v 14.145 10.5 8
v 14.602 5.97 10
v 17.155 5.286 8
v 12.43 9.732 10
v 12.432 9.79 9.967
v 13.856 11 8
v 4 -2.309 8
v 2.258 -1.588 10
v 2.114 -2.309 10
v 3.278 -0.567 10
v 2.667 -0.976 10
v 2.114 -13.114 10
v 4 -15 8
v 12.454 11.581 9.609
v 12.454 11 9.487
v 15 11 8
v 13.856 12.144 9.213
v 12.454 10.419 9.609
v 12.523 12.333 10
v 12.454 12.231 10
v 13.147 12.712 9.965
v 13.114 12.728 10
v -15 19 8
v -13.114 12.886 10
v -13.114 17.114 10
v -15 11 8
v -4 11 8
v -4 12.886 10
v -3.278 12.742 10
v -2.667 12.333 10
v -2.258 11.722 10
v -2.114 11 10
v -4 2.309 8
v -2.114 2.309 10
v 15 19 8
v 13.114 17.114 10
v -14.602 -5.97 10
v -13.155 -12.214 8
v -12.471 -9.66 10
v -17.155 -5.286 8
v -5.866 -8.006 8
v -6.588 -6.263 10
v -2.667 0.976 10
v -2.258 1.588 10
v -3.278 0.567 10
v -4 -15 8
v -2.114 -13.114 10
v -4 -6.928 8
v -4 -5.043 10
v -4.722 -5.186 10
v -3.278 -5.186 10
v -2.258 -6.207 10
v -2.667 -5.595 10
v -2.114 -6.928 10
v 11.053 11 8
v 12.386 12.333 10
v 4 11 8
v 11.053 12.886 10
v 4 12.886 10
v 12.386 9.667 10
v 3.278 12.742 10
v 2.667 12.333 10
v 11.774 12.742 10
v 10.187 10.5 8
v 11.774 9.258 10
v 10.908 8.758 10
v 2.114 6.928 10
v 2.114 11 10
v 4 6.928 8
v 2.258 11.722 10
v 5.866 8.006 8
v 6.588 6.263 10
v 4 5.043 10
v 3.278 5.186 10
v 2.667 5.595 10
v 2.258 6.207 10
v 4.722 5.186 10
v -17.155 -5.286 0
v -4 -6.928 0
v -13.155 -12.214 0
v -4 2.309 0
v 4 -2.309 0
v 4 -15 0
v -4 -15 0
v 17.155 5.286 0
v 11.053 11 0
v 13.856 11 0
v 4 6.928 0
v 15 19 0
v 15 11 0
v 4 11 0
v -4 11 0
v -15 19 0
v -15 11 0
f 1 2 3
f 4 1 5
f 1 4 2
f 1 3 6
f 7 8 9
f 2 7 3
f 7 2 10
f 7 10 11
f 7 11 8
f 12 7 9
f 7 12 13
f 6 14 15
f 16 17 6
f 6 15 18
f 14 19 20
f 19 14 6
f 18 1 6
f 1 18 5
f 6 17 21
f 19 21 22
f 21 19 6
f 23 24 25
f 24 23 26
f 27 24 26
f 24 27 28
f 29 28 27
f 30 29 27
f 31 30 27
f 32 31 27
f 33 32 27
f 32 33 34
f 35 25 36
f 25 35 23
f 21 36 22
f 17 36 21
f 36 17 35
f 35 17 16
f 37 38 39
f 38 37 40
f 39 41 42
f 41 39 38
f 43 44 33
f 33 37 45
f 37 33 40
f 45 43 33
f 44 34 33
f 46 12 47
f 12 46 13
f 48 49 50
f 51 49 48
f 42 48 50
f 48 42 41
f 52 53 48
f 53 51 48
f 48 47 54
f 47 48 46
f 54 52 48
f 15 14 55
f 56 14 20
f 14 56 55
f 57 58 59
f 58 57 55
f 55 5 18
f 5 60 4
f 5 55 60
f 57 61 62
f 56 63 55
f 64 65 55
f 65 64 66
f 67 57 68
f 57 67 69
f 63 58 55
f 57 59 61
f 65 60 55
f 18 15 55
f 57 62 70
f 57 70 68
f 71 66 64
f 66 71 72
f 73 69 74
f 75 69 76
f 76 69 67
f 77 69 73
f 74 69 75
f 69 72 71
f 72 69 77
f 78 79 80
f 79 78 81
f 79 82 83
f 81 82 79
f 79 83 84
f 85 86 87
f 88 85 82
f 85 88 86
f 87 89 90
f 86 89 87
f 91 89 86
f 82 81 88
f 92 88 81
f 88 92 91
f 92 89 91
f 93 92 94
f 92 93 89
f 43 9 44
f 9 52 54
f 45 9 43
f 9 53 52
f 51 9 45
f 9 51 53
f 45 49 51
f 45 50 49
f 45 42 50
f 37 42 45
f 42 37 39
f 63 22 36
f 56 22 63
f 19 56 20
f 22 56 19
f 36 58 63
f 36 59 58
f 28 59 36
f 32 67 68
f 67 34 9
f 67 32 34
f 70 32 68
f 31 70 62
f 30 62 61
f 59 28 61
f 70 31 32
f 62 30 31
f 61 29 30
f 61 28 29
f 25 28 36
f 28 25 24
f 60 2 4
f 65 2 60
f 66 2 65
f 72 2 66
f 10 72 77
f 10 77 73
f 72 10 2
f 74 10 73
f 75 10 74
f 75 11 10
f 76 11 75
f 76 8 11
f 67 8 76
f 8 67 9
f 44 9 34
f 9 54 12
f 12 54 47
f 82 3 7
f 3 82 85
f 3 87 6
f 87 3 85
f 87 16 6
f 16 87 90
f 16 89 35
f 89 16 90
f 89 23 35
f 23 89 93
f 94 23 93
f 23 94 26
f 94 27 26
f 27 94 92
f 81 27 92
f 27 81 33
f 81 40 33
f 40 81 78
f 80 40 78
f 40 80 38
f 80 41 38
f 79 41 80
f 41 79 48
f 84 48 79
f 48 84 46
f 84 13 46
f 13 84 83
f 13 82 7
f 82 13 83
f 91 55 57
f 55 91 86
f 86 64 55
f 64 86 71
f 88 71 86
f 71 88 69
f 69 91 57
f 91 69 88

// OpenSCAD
bevel_extrude_example();

module bevel_extrude_example()
{
	bevel_extrude(height=10,bevel_depth=2,$fn=16) 
	example_shape();
}

module example_shape()
{
	union()
	{
		square([8,30],true);
		rotate(30)
		square([35,8],true);
	
		translate([0,15])
		square([30,8],true);
	}
}

module bevel_border(size=1)
{
	difference()
	{
		minkowski()
		{
			child();
			square(size,true);
		}
		child();
	}
}

module bevel_cutaway(bevel_depth=5)
{
	translate([0,0,-bevel_depth])
	minkowski()
	{
		linear_extrude(height=bevel_depth,convexity=5)
		bevel_border(1)
		child();
		cylinder(h=bevel_depth+1,r1=0,r2=bevel_depth*sqrt(2));
	}
}

module bevel_extrude(height=20,bevel_depth=1)
{
	difference()
	{
		linear_extrude(height=height,convexity=5)
		child();

		translate([0,0,height])
		bevel_cutaway(bevel_depth)
		child();
	}	
}
